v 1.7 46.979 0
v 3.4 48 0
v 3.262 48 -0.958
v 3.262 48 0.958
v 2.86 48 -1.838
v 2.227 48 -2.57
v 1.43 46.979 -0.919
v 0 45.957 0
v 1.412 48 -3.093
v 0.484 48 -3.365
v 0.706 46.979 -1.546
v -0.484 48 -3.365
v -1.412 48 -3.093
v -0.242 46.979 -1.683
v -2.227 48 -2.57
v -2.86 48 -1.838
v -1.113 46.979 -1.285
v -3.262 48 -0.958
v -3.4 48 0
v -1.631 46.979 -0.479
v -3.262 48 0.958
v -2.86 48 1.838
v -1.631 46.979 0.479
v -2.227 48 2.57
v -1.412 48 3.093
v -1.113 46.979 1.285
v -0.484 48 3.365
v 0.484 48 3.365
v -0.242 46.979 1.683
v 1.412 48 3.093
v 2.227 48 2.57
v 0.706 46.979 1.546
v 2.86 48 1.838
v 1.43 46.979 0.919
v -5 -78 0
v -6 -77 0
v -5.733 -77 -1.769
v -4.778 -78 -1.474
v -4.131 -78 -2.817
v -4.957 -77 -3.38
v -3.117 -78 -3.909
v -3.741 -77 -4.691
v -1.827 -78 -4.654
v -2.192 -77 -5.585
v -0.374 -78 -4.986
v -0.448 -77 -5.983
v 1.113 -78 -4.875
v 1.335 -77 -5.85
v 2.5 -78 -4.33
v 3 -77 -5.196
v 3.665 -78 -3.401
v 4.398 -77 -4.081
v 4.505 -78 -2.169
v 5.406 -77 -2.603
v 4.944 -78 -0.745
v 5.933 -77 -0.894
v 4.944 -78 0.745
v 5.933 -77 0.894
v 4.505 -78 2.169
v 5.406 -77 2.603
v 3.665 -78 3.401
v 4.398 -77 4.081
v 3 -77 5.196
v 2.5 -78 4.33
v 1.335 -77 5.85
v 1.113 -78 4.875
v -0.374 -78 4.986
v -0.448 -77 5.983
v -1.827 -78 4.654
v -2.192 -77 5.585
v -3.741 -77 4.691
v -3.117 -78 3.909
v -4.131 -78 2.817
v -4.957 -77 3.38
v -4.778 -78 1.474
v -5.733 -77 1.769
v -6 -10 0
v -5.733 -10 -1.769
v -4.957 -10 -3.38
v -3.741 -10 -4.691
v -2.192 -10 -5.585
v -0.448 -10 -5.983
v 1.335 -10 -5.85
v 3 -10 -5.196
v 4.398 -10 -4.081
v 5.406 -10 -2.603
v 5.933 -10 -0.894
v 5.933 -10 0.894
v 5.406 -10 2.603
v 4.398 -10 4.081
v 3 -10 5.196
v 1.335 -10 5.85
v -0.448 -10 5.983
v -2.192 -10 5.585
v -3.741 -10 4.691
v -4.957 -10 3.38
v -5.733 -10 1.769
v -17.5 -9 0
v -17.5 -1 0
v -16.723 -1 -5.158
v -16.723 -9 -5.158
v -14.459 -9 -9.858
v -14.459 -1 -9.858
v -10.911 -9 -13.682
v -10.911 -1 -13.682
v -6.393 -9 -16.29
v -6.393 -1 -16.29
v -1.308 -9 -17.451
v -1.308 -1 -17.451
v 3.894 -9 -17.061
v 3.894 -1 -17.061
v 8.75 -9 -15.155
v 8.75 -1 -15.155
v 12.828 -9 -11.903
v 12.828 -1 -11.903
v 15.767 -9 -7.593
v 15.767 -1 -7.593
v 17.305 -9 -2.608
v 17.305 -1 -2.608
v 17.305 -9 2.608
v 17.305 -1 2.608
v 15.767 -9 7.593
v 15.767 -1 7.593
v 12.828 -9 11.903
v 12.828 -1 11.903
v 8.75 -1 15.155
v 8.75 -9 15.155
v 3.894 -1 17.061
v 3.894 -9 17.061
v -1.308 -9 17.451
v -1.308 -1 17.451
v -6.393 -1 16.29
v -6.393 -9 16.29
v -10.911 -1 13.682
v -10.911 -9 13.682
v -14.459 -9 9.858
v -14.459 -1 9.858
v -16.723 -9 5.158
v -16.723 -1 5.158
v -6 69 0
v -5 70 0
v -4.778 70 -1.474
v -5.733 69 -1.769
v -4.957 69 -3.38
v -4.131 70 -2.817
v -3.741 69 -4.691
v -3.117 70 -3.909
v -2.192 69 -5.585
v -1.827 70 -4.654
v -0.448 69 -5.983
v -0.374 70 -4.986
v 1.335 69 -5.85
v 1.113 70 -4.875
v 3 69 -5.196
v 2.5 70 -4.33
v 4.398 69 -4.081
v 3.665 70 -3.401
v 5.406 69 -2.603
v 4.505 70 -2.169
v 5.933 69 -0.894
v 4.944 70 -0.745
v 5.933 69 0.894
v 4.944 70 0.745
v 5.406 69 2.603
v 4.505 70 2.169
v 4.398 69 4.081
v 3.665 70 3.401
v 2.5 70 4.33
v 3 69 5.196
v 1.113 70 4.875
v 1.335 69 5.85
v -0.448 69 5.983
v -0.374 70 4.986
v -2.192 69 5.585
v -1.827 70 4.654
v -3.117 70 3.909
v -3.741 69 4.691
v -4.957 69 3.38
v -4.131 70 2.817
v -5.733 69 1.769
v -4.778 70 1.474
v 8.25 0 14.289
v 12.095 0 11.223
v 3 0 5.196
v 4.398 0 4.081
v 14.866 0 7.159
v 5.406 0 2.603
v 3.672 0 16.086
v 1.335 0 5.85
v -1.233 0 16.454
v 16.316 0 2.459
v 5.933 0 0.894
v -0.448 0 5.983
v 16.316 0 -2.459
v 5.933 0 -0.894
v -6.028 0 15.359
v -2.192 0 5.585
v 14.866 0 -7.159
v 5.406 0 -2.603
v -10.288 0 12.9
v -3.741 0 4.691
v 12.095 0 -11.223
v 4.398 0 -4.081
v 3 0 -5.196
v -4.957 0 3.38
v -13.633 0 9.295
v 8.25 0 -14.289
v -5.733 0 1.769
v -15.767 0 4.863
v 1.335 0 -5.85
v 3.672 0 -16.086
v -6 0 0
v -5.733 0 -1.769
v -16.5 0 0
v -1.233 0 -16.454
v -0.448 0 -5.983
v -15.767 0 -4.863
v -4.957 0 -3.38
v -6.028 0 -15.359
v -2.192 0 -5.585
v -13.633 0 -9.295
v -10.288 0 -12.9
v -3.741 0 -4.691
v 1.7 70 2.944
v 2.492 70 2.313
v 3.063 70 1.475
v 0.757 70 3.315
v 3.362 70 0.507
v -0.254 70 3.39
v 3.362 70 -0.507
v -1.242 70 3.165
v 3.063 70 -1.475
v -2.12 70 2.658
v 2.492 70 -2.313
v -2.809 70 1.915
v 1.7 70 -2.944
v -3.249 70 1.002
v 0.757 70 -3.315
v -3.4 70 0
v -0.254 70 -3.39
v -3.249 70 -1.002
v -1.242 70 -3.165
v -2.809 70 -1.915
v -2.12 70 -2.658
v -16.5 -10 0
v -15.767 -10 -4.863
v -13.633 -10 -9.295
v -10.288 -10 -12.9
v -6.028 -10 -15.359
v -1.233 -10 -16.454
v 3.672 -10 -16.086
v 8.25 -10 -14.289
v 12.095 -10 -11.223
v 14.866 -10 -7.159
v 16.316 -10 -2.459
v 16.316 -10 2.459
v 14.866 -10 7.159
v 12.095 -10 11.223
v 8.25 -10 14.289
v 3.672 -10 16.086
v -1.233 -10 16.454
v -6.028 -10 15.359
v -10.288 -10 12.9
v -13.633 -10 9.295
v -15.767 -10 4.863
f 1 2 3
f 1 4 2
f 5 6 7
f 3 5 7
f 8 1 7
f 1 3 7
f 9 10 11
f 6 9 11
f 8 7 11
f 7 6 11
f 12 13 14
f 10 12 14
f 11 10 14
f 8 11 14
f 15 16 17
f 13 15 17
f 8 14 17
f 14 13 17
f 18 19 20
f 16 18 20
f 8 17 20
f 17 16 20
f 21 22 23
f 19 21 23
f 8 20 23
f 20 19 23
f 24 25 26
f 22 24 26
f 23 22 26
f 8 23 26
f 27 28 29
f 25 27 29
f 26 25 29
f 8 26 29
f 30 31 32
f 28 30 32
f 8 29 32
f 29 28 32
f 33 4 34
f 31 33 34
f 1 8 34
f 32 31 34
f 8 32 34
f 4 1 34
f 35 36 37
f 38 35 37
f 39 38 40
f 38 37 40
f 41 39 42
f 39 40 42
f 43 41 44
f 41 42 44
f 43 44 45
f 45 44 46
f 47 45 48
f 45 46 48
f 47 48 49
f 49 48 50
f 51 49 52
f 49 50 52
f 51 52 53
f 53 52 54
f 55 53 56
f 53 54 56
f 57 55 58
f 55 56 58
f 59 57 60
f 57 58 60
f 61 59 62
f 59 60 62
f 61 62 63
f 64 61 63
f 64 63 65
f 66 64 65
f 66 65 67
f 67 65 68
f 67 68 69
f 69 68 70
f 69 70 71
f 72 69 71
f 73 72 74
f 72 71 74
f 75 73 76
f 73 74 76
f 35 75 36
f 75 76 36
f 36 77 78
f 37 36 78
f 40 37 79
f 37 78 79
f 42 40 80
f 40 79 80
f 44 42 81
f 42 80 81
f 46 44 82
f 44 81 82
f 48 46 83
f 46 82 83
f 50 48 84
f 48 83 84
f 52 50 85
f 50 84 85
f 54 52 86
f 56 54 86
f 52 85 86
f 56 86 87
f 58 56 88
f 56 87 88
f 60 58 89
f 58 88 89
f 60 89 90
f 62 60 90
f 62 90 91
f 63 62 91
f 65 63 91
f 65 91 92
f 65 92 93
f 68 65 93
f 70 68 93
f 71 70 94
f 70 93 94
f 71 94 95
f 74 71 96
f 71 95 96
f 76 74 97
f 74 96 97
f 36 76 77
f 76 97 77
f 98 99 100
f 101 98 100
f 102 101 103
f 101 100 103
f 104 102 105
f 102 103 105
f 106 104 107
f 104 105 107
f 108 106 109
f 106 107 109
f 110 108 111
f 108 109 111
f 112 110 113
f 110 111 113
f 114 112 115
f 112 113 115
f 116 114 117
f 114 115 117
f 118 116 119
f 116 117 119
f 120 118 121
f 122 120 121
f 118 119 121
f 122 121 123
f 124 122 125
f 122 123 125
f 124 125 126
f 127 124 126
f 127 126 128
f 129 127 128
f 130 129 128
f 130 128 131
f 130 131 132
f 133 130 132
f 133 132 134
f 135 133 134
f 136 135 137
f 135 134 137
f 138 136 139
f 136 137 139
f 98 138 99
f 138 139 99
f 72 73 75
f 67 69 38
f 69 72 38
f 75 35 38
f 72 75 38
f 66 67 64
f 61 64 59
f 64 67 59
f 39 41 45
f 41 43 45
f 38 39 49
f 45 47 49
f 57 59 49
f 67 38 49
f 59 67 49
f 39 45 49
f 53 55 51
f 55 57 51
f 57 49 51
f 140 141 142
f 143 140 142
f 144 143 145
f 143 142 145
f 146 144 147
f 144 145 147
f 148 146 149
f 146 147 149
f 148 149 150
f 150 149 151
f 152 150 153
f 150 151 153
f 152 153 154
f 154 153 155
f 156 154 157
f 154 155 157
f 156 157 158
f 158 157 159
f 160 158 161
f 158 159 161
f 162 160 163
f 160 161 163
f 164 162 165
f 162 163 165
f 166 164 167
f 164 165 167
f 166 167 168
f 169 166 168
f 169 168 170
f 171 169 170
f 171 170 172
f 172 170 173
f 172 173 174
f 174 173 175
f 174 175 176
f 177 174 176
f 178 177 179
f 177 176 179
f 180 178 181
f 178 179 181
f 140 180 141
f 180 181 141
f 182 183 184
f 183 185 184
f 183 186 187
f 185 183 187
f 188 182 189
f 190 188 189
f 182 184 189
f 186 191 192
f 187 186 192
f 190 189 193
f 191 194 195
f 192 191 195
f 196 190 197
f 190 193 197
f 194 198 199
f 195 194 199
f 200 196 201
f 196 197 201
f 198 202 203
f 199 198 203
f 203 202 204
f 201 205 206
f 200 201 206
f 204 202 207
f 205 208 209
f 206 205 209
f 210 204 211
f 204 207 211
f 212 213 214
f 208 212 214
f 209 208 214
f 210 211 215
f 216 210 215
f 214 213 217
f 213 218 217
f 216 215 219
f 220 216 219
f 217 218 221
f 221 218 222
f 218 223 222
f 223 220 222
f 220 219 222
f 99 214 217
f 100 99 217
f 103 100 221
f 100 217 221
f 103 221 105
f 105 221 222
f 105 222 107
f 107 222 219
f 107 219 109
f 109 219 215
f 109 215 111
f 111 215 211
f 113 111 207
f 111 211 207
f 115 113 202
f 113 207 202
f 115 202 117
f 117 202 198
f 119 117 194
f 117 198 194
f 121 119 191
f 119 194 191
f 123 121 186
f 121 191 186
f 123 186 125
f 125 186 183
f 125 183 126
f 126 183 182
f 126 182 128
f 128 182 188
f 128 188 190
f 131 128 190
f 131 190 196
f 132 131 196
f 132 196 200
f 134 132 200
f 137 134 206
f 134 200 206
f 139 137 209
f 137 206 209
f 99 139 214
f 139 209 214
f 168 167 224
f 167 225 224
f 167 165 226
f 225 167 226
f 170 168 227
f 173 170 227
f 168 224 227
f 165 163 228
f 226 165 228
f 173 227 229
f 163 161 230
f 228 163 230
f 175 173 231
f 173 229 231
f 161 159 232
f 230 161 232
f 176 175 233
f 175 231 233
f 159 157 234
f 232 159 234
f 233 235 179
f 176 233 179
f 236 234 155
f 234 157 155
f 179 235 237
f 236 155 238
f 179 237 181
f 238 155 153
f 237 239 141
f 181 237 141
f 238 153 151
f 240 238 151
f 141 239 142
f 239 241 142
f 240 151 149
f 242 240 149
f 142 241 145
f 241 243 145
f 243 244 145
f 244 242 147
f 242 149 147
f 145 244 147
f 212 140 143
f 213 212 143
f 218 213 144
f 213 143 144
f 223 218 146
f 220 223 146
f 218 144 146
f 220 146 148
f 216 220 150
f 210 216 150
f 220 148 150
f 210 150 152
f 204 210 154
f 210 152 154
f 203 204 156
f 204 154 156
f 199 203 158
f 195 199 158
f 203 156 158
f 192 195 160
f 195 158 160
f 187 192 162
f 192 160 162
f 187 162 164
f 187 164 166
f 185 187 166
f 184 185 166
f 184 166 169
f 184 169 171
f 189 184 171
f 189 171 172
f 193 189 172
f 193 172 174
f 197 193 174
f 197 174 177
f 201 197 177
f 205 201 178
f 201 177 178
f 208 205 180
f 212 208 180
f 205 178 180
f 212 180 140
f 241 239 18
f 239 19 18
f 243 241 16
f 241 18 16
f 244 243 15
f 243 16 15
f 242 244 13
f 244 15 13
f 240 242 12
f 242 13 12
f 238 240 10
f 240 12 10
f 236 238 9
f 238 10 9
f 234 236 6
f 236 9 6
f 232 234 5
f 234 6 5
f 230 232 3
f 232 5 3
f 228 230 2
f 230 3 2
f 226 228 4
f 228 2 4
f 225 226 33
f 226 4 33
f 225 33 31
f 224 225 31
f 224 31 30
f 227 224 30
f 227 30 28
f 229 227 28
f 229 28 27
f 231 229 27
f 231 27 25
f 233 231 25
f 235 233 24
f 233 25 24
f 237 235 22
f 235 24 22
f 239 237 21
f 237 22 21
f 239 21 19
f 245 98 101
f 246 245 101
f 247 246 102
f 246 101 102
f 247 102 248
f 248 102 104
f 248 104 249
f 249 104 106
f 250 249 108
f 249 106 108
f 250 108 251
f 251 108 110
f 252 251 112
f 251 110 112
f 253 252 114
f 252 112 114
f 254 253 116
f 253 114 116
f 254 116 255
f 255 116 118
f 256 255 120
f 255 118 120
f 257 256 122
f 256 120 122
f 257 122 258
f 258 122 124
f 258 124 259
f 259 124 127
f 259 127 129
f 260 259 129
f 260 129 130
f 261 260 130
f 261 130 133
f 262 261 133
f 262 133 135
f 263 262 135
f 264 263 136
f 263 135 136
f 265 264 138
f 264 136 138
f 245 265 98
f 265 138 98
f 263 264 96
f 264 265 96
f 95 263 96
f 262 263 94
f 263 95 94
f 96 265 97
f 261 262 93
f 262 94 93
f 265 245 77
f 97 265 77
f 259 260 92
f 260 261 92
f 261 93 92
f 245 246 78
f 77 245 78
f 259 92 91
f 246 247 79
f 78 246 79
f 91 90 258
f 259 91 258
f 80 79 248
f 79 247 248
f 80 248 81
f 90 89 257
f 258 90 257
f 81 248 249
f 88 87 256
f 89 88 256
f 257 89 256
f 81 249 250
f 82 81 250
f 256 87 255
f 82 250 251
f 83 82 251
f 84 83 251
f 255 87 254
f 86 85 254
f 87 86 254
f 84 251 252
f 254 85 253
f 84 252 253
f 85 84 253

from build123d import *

# Parameters (mm, degrees)
CHAMFER1_SIZE         = 1
TROU_TARAUD_M81_D     = 6.8
TROU_TARAUD_M81_DEPTH = 22
TROU_TARAUD_M81_TIP   = 2.042926105


with BuildPart() as part:
    # Sketch1 → Revolve1 (revolve)
    with BuildSketch(Plane.XY):
        Polygon((0, 70), (0, -78), (-6, -78), (-6, -10), (-17.5, -10), (-17.5, 0), (-6, 0), (-6, 70), align=None)
    revolve(axis=Axis((0, 34.427667765, 0), (0, -1, 0)))

    # Chamfer1
    chamfer1_edges = [part.edges().sort_by_distance(p)[0] for p in [
        (6, 70, 0),
        (17.5, 0, 0),
        (17.5, -10, 0),
        (6, -78, 0),
    ]]
    chamfer(chamfer1_edges, length=CHAMFER1_SIZE)

    # Trou taraudé M81
    with Locations(Plane(origin=(0, 70, 0), x_dir=(1, 0, 0), z_dir=(0, 1, 0))):
        with Locations((0, 0)):
            Hole(TROU_TARAUD_M81_D / 2, depth=TROU_TARAUD_M81_DEPTH)
            with Locations((0, 0, -(TROU_TARAUD_M81_DEPTH + TROU_TARAUD_M81_TIP / 2))):  # 118° drill point
                Cone(0, TROU_TARAUD_M81_D / 2, TROU_TARAUD_M81_TIP, mode=Mode.SUBTRACT)


solid = part.part
